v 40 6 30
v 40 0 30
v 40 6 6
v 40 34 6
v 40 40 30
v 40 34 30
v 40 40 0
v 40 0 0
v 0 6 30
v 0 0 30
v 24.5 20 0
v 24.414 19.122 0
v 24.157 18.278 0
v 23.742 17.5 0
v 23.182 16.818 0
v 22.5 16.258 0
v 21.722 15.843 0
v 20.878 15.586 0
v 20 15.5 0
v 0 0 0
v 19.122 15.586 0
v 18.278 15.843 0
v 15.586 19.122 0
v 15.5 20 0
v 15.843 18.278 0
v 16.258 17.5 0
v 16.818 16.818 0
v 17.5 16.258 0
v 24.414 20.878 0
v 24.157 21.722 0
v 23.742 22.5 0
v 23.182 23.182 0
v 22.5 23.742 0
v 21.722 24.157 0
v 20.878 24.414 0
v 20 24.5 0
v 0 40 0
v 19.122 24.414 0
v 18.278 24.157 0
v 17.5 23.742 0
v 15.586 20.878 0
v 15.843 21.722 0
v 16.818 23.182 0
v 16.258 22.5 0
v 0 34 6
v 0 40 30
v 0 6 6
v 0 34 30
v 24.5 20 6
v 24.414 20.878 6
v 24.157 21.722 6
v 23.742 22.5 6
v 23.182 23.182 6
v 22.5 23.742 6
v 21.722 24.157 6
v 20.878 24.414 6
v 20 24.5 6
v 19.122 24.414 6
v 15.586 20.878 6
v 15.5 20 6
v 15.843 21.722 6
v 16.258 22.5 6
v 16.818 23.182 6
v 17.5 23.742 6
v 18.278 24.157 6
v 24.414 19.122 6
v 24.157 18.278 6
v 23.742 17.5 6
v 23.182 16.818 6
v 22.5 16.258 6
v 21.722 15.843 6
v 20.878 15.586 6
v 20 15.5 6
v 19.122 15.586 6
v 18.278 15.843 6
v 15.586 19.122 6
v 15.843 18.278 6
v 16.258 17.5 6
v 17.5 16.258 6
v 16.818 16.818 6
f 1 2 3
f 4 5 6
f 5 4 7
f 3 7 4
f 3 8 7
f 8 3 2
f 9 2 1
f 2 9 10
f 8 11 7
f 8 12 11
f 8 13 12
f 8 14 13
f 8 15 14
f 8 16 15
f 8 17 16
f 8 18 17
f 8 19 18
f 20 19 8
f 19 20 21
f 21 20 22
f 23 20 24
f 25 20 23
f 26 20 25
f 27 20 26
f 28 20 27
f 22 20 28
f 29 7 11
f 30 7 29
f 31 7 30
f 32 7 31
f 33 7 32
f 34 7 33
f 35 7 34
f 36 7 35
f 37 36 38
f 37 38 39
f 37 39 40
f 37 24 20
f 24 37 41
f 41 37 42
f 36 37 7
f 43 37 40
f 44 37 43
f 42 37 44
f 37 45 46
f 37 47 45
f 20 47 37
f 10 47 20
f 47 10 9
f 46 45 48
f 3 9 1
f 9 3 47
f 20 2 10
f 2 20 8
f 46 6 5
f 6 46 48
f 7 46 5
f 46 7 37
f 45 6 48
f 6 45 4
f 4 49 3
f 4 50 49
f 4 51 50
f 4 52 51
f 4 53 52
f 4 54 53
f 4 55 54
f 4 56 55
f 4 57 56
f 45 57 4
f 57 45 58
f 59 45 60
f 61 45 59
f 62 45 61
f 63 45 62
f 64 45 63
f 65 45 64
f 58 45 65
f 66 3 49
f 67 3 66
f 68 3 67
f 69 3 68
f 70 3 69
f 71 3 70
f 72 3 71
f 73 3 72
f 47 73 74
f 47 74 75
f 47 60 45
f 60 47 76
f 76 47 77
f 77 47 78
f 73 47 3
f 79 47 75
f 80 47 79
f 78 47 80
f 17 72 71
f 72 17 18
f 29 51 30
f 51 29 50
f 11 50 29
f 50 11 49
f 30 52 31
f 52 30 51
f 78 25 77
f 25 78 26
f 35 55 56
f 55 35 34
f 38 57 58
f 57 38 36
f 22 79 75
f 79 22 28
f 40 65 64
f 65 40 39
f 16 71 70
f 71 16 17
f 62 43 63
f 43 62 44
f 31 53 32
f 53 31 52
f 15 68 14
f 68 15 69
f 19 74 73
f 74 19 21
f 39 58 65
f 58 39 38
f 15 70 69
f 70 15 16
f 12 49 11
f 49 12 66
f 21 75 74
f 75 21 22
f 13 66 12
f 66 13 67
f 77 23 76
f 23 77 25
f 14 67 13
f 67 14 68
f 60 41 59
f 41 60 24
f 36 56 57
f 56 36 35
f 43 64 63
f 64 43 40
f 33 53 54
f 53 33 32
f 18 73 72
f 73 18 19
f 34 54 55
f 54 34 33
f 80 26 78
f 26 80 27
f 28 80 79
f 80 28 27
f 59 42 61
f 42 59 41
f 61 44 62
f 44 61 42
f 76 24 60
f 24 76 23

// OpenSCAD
$fn = 32;

// ----------------------------------------------------------------------
// U-bracket: 40 x 40 x 30 mm
// ----------------------------------------------------------------------

// --- parameters (mm) ---
base_len = 40;            // outer length, X
channel_w = 40;           // outer width, Y
upright_h = 30;           // upright height, Z
mat_t = 6;                // wall thickness
hole_d = 9;               // clearance for M8

module hole_z(px, py) {
  translate([px, py, -0.5]) cylinder(h = mat_t + 1, d = hole_d);
}
module hole_y_pz(pz) {
  /* through both uprights along Y */
  translate([0, -0.5, pz]) rotate([-90, 0, 0]) cylinder(h = channel_w + 1, d = hole_d);
}

module base() {
  cube([base_len, channel_w, mat_t]);
}

module uprights() {
  cube([base_len, mat_t, upright_h]);
  translate([0, channel_w - mat_t, 0]) cube([base_len, mat_t, upright_h]);
}

difference() {
  union() {
    base();
    uprights();
  }
  hole_z(20, 20);
}
